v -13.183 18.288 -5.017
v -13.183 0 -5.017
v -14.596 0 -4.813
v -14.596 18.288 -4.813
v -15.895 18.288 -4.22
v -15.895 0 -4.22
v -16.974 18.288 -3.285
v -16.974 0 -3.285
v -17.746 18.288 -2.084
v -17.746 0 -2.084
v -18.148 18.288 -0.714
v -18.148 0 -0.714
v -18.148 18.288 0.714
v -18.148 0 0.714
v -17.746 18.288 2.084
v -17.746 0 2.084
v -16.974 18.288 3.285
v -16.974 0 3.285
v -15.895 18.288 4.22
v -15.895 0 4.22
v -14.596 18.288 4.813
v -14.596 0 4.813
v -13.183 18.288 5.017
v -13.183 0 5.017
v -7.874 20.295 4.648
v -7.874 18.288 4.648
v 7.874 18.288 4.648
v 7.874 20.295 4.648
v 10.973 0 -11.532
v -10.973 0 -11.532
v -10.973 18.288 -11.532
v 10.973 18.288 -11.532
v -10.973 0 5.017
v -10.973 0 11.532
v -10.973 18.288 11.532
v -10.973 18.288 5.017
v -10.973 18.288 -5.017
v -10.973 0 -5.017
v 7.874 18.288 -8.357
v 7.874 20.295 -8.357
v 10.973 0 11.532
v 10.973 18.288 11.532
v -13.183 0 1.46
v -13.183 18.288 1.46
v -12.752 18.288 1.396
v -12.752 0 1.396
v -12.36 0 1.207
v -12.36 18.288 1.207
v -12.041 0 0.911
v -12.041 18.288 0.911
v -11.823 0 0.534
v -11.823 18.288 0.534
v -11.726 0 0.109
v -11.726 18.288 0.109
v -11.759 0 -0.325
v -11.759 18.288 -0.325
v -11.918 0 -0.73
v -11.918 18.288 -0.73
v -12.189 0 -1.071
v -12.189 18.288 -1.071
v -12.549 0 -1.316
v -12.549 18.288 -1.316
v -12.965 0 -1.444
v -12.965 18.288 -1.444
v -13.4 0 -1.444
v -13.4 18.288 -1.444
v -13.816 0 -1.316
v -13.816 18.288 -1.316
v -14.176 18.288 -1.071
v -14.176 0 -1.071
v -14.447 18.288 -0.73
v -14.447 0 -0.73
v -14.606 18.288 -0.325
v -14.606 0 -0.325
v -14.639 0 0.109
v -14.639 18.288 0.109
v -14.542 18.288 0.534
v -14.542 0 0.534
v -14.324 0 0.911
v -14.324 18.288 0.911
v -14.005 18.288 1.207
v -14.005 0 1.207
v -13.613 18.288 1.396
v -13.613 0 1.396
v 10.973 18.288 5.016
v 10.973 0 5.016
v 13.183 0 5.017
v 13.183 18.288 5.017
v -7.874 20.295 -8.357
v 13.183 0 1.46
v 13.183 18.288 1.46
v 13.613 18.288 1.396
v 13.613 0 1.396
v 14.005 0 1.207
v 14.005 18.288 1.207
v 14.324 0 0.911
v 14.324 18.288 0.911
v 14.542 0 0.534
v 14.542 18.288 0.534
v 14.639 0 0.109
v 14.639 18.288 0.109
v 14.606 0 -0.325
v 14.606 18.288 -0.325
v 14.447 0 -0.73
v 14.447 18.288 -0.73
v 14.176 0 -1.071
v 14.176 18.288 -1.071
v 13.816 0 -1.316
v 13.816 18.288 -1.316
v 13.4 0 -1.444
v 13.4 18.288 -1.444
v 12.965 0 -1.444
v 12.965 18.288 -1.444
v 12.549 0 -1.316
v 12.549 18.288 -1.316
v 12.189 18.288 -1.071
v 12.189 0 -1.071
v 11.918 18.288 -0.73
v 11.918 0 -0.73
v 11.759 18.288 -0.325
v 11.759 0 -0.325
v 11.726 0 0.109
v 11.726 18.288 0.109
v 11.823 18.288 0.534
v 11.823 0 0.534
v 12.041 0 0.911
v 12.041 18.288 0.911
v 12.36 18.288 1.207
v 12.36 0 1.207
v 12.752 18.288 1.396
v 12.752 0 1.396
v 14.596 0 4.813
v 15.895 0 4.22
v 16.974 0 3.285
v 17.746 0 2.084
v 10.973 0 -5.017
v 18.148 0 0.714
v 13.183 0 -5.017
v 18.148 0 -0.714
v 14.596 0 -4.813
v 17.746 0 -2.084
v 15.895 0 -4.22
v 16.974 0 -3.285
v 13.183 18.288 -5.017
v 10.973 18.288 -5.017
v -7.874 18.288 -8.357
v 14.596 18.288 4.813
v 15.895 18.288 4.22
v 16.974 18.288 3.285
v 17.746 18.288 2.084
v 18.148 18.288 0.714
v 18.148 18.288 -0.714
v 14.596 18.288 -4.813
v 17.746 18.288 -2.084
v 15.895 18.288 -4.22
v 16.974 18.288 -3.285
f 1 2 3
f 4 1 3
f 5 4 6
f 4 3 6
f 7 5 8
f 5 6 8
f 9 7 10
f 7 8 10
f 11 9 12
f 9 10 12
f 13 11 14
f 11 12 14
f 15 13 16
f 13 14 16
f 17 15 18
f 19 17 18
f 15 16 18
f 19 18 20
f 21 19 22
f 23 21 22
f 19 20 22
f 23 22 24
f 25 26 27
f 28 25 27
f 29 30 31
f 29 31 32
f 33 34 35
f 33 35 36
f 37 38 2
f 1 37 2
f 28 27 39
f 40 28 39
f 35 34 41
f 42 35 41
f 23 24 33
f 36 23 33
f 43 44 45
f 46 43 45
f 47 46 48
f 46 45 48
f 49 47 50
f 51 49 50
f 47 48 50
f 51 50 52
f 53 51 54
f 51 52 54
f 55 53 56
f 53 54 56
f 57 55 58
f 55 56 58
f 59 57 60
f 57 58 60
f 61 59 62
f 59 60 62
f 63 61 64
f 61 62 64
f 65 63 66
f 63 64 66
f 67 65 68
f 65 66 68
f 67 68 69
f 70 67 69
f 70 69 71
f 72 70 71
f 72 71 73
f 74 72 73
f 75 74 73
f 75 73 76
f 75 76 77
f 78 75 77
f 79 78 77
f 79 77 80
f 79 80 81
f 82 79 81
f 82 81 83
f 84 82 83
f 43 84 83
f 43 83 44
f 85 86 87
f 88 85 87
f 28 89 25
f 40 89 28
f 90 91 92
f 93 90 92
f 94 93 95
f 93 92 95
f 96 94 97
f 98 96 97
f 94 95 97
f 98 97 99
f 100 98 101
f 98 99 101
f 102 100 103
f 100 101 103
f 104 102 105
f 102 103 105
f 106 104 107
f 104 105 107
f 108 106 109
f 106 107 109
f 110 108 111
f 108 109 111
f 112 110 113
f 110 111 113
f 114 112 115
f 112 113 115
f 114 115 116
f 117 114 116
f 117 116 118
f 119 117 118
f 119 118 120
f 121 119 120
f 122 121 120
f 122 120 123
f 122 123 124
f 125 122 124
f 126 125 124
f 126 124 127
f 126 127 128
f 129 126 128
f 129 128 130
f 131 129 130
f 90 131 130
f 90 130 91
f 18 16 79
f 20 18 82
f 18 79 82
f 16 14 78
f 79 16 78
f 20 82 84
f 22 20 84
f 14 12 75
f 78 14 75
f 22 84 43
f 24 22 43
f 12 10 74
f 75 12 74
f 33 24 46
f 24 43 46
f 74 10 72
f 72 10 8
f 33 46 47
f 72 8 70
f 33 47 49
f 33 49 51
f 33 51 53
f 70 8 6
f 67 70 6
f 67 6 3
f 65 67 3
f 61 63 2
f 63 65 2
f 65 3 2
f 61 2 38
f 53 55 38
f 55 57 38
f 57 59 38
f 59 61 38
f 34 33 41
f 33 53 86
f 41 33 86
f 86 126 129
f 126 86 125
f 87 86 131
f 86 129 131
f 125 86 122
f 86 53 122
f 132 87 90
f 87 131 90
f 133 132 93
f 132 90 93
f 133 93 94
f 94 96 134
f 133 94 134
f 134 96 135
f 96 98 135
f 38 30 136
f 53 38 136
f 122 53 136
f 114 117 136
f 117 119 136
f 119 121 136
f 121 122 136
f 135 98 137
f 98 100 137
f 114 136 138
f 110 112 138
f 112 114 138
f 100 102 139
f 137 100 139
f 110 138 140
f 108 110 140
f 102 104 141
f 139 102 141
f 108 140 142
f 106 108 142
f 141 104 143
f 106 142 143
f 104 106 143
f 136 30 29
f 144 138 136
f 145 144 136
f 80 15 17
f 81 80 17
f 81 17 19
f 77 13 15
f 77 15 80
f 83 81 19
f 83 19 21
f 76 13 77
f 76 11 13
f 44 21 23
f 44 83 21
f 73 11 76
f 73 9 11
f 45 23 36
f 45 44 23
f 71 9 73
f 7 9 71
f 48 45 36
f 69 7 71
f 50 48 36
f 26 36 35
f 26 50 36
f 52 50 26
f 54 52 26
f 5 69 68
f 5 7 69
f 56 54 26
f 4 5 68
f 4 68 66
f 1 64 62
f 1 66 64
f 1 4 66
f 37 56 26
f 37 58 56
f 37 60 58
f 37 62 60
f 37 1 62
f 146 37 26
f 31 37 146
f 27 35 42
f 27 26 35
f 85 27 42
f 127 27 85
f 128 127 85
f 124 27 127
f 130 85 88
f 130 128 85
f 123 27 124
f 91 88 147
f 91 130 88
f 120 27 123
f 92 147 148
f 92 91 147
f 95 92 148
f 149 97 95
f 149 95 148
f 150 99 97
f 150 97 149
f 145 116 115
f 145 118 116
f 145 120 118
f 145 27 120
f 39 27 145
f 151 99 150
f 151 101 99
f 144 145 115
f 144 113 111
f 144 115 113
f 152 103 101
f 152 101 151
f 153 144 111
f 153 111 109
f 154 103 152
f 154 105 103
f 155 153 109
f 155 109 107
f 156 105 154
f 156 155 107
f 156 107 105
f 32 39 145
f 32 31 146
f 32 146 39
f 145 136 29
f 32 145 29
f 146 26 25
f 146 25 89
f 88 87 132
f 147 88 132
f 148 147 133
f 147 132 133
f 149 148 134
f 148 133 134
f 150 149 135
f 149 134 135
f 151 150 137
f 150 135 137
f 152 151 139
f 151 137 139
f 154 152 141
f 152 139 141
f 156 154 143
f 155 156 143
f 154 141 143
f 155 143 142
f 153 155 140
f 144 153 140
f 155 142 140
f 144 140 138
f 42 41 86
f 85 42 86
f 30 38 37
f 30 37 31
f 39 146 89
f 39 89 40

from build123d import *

# Parameters (mm, degrees)
SKETCH1_W           = 21.9456
SKETCH1_H           = 10.033
SKETCH1_H_2         = 6.5151
BOSS_EXTRUDE1_DEPTH = 18.288
SKETCH2_W           = 15.748
SKETCH2_H           = 13.0048
BOSS_EXTRUDE2_DEPTH = 2.0066
SKETCH3_R           = 1.4605
CUT_EXTRUDE1_DEPTH  = 29.260148325


with BuildPart() as part:
    # Sketch1 → Boss-Extrude1 (new body)
    with BuildSketch(Plane(origin=(0, 0, 0), x_dir=(1, 0, 0), z_dir=(0, 1, 0))):
        with BuildLine():
            Line((-13.1826, -5.0165), (-10.9728, -5.0165))
            Line((-10.9728, -5.0165), (-10.9728, 5.0165))
            Line((-10.9728, 5.0165), (-13.1826, 5.0165))
            ThreePointArc((-13.1826, 5.0165), (-18.1991, 0), (-13.1826, -5.0165))
        make_face()
        Rectangle(SKETCH1_W, SKETCH1_H)
        with Locations((0, -8.27405)):
            Rectangle(SKETCH1_W, SKETCH1_H_2)
        with BuildLine():
            Line((10.9728, 5.0165), (10.9728, -5.0165))
            Line((10.9728, -5.0165), (13.1826, -5.0165))
            ThreePointArc((13.1826, -5.0165), (18.1991, 0), (13.1826, 5.0165))
            Line((13.1826, 5.0165), (10.9728, 5.0165))
        make_face()
        with Locations((0, 8.27405)):
            Rectangle(SKETCH1_W, SKETCH1_H_2)
    extrude(amount=BOSS_EXTRUDE1_DEPTH)

    # Sketch2 → Boss-Extrude2 (add)
    with BuildSketch(Plane(origin=(0, 18.288, 0), x_dir=(1, 0, 0), z_dir=(0, 1, 0))):
        with Locations((0, 1.8542)):
            Rectangle(SKETCH2_W, SKETCH2_H)
    extrude(amount=BOSS_EXTRUDE2_DEPTH)

    # Sketch3 → Cut-Extrude1 (cut, through all)
    with BuildSketch(Plane(origin=(0, 18.288, 0), x_dir=(1, 0, 0), z_dir=(0, 1, 0))):
        with Locations(Location((-13.1826, 0, 0), (0, 0, 270))):
            Circle(SKETCH3_R)
        with Locations(Location((13.1826, 0, 0), (0, 0, 270))):
            Circle(SKETCH3_R)
    extrude(amount=-CUT_EXTRUDE1_DEPTH, mode=Mode.SUBTRACT)


solid = part.part
